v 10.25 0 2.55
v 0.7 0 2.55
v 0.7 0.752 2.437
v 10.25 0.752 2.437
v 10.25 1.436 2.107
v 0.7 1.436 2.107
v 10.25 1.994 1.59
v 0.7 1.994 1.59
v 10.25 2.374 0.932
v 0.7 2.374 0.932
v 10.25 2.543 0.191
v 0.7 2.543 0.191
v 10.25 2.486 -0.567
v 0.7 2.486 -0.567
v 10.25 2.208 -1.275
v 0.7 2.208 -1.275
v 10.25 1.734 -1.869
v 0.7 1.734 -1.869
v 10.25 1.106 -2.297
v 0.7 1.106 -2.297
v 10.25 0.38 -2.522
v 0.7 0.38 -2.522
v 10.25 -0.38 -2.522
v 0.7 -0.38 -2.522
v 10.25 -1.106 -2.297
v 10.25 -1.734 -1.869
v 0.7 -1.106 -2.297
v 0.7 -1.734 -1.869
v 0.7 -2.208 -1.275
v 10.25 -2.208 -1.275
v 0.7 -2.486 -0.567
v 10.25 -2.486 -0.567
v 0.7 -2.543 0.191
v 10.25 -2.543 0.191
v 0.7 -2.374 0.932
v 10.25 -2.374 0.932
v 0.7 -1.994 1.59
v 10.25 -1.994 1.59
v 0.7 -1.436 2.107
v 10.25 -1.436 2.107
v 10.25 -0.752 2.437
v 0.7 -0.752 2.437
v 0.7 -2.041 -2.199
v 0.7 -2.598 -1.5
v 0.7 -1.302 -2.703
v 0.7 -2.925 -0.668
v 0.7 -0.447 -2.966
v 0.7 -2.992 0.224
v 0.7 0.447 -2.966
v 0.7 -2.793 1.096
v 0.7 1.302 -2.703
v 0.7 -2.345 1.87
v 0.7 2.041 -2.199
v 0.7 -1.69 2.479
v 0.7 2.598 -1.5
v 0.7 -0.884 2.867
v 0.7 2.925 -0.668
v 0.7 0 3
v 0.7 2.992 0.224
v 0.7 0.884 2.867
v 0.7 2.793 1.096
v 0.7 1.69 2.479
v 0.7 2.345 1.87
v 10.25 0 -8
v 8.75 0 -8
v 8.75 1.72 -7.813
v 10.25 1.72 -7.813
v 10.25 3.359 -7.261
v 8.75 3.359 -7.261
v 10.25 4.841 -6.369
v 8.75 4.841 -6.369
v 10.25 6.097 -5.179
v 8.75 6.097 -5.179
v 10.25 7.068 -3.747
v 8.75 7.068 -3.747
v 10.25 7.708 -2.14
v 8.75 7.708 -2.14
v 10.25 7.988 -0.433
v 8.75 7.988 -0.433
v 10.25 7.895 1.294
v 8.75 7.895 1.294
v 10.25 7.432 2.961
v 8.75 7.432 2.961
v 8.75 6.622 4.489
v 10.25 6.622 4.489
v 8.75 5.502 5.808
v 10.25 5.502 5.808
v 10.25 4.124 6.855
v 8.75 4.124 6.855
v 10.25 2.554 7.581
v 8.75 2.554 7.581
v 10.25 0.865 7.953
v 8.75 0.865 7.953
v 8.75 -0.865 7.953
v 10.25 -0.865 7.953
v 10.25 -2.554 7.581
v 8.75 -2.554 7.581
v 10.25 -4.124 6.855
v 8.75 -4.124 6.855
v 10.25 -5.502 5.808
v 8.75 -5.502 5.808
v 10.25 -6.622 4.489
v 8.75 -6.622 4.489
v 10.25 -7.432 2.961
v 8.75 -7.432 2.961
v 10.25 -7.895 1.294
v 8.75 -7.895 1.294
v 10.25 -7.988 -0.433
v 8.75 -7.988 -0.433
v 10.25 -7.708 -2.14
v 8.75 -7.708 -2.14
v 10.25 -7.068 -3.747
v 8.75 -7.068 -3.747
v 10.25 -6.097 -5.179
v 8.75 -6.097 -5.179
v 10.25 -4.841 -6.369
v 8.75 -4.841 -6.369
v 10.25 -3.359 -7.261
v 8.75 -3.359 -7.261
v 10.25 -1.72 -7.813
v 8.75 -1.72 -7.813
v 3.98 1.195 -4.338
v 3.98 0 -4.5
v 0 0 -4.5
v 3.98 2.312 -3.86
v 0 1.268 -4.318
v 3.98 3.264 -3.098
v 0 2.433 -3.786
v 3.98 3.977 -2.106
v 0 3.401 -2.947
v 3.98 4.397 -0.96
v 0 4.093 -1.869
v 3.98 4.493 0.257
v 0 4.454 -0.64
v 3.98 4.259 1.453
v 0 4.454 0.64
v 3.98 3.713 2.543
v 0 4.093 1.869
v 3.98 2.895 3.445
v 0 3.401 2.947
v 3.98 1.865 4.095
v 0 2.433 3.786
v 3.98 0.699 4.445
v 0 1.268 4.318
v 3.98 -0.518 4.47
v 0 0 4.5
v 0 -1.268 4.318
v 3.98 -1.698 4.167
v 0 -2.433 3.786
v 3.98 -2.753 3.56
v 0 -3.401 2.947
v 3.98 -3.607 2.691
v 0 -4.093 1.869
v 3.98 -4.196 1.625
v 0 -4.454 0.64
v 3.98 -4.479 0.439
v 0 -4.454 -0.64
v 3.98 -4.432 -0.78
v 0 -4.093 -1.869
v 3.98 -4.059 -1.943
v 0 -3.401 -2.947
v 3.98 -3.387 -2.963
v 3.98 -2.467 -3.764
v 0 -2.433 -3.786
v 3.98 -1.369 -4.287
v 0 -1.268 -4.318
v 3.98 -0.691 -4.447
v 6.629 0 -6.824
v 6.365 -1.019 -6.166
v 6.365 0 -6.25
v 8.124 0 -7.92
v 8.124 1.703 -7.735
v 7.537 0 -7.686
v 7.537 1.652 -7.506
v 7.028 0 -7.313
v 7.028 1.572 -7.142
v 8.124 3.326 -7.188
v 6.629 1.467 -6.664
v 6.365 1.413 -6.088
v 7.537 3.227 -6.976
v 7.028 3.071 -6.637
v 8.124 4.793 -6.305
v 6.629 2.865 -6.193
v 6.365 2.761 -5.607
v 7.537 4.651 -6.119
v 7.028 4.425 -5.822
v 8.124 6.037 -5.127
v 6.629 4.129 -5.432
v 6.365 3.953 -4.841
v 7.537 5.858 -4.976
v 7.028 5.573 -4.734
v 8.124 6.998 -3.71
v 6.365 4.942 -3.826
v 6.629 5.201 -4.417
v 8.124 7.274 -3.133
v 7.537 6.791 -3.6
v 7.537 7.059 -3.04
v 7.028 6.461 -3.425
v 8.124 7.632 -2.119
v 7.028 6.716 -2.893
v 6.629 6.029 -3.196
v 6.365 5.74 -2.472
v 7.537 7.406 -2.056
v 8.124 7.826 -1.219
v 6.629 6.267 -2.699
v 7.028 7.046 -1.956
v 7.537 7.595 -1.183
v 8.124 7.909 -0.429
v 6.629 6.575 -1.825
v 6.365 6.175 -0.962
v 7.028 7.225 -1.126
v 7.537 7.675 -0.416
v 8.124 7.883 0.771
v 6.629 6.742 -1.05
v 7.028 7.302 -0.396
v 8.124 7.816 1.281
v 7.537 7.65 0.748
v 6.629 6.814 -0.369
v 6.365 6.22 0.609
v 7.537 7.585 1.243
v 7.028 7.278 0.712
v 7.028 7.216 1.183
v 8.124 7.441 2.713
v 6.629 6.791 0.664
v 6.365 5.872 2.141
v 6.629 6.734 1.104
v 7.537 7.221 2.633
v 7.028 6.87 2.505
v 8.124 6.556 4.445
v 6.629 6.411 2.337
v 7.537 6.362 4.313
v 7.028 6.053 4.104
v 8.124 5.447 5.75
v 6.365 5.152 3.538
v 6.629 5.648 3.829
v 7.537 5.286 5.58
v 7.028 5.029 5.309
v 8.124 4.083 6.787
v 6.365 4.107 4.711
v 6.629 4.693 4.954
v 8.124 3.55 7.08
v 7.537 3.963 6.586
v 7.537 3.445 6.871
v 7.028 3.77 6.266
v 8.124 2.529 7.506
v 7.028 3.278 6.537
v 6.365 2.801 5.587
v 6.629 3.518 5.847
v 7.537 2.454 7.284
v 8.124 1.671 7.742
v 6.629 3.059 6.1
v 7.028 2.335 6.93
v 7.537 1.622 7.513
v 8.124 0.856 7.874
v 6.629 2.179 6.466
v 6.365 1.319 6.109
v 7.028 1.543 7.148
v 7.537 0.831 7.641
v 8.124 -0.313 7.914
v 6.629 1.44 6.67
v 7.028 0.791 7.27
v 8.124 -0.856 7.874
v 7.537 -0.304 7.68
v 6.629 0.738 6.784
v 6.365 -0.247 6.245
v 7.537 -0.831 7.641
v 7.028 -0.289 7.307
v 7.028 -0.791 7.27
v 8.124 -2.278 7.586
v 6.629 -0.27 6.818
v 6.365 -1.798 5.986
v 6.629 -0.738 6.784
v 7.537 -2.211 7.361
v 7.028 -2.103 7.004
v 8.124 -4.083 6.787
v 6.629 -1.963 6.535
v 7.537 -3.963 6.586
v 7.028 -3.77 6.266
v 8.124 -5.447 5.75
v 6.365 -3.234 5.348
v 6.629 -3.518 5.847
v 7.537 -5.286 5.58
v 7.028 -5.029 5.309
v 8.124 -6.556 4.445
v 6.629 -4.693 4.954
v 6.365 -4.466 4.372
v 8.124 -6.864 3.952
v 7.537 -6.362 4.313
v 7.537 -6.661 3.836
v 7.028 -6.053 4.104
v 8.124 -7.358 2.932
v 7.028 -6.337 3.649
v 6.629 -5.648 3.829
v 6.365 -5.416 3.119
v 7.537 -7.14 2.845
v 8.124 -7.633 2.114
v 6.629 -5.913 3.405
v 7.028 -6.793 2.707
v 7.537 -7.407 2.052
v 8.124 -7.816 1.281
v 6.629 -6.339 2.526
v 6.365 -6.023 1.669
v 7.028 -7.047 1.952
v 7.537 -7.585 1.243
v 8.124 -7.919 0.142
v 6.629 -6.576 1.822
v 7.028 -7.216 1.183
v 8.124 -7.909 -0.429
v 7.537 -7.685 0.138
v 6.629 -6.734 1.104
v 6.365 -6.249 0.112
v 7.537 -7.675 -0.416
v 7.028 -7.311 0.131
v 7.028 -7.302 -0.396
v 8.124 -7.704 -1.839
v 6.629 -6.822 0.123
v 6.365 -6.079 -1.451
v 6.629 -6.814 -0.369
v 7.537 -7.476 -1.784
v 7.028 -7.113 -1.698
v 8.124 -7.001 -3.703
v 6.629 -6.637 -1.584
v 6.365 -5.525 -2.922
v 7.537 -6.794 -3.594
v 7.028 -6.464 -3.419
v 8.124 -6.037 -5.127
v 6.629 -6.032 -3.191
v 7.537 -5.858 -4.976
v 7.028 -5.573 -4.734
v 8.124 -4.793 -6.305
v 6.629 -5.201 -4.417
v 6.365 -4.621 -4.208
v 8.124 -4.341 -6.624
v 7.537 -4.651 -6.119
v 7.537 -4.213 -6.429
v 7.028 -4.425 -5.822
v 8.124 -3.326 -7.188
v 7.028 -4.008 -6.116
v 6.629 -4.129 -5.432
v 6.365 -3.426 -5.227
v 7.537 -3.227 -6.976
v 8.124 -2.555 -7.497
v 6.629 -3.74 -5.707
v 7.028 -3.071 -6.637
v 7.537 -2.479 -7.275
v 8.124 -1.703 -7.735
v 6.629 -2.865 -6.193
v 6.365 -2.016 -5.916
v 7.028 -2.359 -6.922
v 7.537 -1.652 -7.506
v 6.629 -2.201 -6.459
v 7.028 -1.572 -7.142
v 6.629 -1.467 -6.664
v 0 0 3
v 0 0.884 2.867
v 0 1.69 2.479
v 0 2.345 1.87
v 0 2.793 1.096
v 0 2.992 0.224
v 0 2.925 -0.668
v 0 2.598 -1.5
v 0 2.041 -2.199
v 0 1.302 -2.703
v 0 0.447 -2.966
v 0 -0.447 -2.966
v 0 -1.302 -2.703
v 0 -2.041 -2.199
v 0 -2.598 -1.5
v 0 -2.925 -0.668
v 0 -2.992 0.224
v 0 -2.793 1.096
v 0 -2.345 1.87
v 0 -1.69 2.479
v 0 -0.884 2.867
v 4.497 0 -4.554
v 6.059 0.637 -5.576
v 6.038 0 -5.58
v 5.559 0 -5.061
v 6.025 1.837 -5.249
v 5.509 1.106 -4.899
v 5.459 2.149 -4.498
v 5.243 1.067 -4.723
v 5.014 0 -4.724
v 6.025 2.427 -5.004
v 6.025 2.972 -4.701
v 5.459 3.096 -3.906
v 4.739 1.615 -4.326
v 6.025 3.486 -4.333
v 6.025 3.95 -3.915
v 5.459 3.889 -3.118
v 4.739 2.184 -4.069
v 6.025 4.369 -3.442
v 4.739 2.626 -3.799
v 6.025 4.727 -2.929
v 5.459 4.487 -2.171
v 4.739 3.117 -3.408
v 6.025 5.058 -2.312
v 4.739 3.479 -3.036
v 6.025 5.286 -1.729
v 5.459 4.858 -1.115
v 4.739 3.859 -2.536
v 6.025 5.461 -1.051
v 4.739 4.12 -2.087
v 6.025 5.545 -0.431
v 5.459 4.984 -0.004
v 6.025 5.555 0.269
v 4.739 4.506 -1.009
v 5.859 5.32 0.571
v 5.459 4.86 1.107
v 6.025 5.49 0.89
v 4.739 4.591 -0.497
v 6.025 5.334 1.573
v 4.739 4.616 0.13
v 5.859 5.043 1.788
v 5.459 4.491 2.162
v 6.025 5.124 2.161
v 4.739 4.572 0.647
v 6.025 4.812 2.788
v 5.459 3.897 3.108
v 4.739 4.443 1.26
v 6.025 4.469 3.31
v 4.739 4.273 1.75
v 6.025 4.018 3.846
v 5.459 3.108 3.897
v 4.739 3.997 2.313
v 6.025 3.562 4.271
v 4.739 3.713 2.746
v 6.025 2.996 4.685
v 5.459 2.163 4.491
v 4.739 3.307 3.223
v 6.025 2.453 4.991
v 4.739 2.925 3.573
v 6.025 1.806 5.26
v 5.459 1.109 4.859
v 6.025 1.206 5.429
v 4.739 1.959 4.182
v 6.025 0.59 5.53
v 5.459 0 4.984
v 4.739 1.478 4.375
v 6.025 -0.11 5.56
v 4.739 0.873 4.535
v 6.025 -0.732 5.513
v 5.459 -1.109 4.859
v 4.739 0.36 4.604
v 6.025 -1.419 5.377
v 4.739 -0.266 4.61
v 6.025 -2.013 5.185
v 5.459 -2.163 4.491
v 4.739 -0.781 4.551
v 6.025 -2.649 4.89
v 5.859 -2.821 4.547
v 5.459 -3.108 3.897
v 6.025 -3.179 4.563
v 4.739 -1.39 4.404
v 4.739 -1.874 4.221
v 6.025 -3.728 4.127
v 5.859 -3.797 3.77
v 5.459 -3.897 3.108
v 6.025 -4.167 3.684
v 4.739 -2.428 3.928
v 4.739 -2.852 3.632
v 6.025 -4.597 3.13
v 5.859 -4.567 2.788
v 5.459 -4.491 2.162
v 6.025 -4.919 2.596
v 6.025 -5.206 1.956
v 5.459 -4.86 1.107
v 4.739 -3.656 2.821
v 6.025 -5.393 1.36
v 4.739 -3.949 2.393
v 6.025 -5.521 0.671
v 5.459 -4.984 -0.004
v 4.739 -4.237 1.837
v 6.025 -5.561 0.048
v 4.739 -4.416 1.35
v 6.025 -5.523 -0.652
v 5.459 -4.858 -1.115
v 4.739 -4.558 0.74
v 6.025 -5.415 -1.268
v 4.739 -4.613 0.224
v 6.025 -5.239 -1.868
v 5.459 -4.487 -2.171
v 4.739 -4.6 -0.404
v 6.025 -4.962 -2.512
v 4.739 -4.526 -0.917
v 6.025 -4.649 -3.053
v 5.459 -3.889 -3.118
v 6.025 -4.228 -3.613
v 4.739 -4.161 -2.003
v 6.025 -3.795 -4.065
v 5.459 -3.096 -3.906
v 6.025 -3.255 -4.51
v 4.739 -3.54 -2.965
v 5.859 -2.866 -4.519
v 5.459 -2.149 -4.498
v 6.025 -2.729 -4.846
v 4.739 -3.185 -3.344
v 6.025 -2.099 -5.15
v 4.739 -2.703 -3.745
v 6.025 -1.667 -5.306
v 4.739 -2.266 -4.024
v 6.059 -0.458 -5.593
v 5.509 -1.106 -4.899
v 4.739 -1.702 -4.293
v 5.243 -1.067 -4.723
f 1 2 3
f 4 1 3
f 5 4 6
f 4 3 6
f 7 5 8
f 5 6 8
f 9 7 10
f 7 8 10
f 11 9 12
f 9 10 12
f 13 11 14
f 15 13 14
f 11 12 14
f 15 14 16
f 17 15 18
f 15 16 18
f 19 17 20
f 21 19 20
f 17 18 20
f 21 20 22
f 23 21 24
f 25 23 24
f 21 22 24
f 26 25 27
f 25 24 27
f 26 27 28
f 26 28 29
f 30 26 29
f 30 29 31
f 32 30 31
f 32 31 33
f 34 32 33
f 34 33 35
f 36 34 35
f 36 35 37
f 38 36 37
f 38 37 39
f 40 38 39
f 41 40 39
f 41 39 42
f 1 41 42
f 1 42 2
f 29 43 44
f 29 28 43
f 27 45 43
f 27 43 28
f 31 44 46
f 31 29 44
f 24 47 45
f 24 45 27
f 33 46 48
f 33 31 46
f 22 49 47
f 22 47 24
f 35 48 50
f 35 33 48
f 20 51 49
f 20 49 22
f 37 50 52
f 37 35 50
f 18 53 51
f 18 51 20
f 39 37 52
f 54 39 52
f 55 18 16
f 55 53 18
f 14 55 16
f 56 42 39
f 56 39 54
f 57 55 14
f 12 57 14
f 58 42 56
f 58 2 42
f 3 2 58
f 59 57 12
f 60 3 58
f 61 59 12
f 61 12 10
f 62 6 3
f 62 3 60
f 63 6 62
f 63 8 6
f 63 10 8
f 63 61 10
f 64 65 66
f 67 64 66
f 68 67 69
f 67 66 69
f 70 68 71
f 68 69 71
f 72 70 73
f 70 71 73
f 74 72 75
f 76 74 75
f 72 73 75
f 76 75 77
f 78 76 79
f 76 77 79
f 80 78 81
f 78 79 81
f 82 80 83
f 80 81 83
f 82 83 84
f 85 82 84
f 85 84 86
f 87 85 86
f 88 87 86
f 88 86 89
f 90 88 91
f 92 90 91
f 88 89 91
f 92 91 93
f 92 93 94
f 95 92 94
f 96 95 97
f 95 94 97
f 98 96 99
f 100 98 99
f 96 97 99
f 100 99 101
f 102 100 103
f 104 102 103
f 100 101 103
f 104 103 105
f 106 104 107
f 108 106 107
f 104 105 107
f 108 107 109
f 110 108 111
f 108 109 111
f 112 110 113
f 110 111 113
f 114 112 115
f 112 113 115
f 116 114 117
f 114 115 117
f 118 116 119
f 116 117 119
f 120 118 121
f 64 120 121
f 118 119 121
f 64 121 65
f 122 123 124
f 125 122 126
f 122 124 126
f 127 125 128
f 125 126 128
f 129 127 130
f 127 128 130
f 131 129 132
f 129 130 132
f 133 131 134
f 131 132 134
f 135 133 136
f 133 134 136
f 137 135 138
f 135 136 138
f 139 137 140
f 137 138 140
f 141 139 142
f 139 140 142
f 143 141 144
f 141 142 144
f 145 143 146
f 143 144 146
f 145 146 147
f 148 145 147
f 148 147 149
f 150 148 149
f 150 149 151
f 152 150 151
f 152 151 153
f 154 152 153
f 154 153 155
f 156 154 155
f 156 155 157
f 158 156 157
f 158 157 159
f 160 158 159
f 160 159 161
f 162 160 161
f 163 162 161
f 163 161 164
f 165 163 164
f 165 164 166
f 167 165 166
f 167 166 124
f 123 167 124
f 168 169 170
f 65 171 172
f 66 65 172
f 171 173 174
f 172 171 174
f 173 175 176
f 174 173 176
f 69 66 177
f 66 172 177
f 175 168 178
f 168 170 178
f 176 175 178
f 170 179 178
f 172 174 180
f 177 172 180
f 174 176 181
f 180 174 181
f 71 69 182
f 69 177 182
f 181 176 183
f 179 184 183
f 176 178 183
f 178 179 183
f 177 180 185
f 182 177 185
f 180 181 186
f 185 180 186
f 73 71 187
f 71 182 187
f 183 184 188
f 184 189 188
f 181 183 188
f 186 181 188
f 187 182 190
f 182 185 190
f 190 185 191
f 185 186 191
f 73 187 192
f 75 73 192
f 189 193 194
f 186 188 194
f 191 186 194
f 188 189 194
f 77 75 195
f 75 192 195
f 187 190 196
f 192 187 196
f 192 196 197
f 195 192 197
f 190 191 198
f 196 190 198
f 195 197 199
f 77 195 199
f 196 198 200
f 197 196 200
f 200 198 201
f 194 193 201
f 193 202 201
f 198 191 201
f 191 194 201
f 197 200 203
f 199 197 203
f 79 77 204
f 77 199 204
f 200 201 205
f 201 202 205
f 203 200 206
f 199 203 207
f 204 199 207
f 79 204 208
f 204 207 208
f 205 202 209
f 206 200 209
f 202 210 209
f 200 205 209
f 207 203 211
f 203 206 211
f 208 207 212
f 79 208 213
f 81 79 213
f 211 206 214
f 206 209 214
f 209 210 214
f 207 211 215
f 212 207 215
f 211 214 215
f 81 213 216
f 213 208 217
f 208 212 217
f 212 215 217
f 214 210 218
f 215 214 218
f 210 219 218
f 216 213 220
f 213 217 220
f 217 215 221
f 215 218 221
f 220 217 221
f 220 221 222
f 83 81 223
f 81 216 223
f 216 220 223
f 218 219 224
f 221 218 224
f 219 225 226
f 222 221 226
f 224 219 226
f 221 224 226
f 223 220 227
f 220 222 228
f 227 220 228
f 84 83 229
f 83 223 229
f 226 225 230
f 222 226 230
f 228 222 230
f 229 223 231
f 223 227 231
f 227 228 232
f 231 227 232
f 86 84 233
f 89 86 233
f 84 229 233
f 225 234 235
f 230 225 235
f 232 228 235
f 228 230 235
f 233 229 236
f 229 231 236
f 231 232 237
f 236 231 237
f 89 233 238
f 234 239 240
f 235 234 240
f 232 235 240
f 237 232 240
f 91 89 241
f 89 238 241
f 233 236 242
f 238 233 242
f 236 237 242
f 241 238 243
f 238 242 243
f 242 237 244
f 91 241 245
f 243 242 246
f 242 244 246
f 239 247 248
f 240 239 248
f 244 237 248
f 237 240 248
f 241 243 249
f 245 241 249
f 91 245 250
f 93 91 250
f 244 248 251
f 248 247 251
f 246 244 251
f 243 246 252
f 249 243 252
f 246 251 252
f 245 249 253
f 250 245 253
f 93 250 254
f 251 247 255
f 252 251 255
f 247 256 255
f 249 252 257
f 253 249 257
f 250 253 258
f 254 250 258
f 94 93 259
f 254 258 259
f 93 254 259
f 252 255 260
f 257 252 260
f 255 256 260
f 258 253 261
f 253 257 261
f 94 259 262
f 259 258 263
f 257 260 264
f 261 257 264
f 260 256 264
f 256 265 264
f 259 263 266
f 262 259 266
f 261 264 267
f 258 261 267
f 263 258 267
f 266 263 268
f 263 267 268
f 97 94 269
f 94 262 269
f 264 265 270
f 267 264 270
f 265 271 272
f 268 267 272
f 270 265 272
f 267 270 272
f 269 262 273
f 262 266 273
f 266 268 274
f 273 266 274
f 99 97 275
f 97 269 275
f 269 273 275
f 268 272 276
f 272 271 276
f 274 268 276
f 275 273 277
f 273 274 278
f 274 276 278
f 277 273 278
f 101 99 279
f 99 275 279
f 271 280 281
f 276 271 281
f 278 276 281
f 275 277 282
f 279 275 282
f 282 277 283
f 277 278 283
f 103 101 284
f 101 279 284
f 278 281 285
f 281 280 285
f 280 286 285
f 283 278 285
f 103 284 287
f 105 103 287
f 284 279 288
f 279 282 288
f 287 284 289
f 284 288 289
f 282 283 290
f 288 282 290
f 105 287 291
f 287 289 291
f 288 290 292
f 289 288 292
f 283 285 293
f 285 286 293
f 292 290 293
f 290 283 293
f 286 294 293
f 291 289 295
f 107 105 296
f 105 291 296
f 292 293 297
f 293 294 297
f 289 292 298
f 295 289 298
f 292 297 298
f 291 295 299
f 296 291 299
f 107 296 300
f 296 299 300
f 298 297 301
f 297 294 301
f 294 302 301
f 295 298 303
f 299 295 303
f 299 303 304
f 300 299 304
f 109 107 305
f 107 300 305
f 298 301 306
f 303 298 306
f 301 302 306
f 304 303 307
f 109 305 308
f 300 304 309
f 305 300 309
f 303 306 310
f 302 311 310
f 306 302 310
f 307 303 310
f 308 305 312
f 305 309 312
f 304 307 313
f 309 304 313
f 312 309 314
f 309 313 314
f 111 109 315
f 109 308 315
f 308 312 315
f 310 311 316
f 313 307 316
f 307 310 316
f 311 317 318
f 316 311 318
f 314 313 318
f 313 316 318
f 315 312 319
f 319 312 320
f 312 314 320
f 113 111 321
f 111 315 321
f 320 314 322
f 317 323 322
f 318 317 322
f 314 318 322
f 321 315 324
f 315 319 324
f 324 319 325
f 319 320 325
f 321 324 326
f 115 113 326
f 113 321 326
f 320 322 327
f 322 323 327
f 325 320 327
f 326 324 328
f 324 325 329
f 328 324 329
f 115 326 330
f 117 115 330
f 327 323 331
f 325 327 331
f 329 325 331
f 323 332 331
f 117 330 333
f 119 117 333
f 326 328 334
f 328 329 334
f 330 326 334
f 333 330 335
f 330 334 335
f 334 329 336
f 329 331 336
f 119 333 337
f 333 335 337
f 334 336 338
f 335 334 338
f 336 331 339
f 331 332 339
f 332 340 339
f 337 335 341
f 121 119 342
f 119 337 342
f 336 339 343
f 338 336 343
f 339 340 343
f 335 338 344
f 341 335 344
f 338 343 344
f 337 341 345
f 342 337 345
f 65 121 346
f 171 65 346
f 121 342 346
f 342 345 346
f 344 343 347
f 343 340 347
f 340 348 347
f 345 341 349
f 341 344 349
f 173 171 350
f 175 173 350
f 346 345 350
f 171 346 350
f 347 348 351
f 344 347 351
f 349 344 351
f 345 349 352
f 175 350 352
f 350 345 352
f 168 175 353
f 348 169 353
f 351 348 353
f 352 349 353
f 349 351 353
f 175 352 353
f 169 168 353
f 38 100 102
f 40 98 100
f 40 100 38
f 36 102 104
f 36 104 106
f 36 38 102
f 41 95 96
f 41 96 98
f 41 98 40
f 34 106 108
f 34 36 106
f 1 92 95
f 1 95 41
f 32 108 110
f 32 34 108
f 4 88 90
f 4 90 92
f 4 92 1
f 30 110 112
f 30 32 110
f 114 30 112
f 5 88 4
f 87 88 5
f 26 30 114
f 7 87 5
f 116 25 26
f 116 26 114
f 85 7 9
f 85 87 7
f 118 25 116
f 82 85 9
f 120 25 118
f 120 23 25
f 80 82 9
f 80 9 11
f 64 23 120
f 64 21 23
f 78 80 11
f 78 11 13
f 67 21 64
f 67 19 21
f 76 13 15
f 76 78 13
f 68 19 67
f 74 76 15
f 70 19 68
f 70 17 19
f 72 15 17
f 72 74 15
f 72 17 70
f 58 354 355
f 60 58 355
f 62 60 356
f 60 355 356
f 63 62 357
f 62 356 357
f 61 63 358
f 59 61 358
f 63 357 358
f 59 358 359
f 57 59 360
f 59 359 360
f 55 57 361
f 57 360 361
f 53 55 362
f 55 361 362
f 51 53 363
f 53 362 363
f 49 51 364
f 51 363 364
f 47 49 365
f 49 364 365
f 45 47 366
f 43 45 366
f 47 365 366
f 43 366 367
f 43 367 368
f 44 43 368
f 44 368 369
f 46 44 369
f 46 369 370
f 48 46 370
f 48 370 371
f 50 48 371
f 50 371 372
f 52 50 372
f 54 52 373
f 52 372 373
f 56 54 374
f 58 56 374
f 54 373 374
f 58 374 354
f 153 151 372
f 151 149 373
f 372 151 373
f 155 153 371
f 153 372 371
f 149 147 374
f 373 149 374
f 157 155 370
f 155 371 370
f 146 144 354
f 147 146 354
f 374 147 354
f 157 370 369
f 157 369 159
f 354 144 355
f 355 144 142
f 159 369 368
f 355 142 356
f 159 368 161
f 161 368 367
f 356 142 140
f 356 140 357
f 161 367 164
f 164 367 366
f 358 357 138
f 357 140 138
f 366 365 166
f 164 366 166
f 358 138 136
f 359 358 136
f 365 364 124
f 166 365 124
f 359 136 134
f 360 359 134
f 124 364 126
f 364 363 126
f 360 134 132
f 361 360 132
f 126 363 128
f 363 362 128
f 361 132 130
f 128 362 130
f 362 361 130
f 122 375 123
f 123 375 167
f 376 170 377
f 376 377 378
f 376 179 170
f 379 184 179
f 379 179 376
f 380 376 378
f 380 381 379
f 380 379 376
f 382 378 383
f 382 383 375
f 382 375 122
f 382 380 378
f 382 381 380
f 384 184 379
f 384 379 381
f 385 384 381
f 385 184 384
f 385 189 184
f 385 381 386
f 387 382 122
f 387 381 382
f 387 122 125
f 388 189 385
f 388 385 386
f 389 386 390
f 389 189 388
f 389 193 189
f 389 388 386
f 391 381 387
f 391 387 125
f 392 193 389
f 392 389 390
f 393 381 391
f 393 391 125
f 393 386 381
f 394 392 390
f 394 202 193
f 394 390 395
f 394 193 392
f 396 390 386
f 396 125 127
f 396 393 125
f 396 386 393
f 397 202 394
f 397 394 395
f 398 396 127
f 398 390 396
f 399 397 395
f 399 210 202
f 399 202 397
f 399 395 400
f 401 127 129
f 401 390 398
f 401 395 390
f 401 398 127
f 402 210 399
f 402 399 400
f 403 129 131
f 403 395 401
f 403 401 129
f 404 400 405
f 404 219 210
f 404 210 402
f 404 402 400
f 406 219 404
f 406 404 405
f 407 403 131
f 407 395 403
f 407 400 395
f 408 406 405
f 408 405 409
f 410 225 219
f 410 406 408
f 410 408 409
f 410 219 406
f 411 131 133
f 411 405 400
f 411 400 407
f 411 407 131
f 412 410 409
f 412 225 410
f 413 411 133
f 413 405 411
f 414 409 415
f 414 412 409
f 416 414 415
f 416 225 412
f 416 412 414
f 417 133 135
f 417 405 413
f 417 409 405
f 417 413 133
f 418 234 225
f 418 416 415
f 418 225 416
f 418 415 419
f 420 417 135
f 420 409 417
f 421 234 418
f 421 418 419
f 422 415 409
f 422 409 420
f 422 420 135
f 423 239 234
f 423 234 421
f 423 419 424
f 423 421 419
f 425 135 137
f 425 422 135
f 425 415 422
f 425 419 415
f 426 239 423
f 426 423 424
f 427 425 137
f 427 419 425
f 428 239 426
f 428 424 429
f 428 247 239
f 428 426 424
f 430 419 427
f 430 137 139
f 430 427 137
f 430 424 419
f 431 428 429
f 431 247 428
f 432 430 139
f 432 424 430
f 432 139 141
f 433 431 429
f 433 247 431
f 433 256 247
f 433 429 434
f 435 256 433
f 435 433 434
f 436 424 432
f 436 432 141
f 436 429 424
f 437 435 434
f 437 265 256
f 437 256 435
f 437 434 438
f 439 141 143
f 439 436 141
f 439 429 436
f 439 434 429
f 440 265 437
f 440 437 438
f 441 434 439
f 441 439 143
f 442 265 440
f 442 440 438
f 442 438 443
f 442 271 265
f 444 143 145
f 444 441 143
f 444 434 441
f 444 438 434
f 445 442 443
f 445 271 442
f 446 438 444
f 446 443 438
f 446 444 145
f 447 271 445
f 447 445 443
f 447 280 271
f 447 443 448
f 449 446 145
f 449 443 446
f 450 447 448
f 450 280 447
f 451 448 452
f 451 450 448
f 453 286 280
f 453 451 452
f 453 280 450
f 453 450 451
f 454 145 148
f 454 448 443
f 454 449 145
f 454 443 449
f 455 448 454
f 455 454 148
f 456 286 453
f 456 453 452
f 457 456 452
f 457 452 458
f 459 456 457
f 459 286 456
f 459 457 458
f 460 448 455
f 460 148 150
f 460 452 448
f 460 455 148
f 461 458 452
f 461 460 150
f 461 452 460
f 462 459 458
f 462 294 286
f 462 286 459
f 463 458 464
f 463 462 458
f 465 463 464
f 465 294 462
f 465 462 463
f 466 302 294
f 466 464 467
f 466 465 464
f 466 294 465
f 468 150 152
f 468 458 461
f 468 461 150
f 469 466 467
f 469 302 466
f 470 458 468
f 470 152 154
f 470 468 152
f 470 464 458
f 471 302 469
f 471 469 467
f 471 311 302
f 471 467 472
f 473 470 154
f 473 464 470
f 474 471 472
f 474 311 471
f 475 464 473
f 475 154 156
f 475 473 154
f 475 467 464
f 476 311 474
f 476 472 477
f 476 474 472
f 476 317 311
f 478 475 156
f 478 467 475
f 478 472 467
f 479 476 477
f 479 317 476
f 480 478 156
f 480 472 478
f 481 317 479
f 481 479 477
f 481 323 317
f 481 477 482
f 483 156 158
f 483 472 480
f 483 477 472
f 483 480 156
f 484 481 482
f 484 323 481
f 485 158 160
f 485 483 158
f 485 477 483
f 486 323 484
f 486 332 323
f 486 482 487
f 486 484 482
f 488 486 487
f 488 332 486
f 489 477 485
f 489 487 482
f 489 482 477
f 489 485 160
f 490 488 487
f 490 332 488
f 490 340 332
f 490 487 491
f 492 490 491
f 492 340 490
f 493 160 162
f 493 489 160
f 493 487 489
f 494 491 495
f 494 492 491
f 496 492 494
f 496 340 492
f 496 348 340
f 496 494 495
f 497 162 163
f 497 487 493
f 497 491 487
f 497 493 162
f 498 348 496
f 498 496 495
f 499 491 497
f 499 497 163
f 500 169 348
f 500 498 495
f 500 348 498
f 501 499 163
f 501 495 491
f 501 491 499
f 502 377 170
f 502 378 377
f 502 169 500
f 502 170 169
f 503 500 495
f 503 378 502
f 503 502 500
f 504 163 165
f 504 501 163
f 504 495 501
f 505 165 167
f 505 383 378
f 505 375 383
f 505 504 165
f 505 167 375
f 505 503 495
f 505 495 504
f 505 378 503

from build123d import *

# Parameters (mm, degrees)
SKETCH1_R           = 4.5
BOSS_EXTRUDE1_DEPTH = 10.25
SKETCH3_R           = 2.55
CUT_EXTRUDE1_DEPTH  = 34
BOSS_EXTRUDE2_START = -4
SKETCH4_R           = 8
SKETCH4_R_2         = 4.5
BOSS_EXTRUDE2_DEPTH = 4
FILLET1_R           = 2.5
FILLET2_R           = 2.5
SKETCH5_R           = 3
SKETCH5_R_2         = 2.55
CUT_EXTRUDE2_DEPTH  = 0.7


with BuildPart() as part:
    # Sketch1 → Boss-Extrude1 (new body)
    with BuildSketch(Plane(origin=(0, 0, 0), x_dir=(0, 0, -1), z_dir=(1, 0, 0))):
        Circle(SKETCH1_R)
    extrude(amount=BOSS_EXTRUDE1_DEPTH)

    # Sketch3 → Cut-Extrude1 (cut)
    with BuildSketch(Plane.ZY):
        Circle(SKETCH3_R)
    extrude(amount=-CUT_EXTRUDE1_DEPTH, mode=Mode.SUBTRACT)

    # Sketch4 → Boss-Extrude2 (add)
    with BuildSketch(Plane(origin=(10.25, 0, 0), x_dir=(0, 0, -1), z_dir=(1, 0, 0)).offset(BOSS_EXTRUDE2_START)):
        Circle(SKETCH4_R)
        Circle(SKETCH4_R_2, mode=Mode.SUBTRACT)
    extrude(amount=BOSS_EXTRUDE2_DEPTH)

    # Fillet1
    fillet1_edges = [part.edges().sort_by_distance(p)[0] for p in [
        (6.25, 0, 8),
    ]]
    fillet(fillet1_edges, radius=FILLET1_R)

    # Fillet2
    fillet2_edges = [part.edges().sort_by_distance(p)[0] for p in [
        (6.25, 0, 4.5),
    ]]
    fillet(fillet2_edges, radius=FILLET2_R)

    # Sketch5 → Cut-Extrude2 (cut)
    with BuildSketch(Plane.ZY):
        Circle(SKETCH5_R)
        Circle(SKETCH5_R_2, mode=Mode.SUBTRACT)
    extrude(amount=-CUT_EXTRUDE2_DEPTH, mode=Mode.SUBTRACT)


solid = part.part
